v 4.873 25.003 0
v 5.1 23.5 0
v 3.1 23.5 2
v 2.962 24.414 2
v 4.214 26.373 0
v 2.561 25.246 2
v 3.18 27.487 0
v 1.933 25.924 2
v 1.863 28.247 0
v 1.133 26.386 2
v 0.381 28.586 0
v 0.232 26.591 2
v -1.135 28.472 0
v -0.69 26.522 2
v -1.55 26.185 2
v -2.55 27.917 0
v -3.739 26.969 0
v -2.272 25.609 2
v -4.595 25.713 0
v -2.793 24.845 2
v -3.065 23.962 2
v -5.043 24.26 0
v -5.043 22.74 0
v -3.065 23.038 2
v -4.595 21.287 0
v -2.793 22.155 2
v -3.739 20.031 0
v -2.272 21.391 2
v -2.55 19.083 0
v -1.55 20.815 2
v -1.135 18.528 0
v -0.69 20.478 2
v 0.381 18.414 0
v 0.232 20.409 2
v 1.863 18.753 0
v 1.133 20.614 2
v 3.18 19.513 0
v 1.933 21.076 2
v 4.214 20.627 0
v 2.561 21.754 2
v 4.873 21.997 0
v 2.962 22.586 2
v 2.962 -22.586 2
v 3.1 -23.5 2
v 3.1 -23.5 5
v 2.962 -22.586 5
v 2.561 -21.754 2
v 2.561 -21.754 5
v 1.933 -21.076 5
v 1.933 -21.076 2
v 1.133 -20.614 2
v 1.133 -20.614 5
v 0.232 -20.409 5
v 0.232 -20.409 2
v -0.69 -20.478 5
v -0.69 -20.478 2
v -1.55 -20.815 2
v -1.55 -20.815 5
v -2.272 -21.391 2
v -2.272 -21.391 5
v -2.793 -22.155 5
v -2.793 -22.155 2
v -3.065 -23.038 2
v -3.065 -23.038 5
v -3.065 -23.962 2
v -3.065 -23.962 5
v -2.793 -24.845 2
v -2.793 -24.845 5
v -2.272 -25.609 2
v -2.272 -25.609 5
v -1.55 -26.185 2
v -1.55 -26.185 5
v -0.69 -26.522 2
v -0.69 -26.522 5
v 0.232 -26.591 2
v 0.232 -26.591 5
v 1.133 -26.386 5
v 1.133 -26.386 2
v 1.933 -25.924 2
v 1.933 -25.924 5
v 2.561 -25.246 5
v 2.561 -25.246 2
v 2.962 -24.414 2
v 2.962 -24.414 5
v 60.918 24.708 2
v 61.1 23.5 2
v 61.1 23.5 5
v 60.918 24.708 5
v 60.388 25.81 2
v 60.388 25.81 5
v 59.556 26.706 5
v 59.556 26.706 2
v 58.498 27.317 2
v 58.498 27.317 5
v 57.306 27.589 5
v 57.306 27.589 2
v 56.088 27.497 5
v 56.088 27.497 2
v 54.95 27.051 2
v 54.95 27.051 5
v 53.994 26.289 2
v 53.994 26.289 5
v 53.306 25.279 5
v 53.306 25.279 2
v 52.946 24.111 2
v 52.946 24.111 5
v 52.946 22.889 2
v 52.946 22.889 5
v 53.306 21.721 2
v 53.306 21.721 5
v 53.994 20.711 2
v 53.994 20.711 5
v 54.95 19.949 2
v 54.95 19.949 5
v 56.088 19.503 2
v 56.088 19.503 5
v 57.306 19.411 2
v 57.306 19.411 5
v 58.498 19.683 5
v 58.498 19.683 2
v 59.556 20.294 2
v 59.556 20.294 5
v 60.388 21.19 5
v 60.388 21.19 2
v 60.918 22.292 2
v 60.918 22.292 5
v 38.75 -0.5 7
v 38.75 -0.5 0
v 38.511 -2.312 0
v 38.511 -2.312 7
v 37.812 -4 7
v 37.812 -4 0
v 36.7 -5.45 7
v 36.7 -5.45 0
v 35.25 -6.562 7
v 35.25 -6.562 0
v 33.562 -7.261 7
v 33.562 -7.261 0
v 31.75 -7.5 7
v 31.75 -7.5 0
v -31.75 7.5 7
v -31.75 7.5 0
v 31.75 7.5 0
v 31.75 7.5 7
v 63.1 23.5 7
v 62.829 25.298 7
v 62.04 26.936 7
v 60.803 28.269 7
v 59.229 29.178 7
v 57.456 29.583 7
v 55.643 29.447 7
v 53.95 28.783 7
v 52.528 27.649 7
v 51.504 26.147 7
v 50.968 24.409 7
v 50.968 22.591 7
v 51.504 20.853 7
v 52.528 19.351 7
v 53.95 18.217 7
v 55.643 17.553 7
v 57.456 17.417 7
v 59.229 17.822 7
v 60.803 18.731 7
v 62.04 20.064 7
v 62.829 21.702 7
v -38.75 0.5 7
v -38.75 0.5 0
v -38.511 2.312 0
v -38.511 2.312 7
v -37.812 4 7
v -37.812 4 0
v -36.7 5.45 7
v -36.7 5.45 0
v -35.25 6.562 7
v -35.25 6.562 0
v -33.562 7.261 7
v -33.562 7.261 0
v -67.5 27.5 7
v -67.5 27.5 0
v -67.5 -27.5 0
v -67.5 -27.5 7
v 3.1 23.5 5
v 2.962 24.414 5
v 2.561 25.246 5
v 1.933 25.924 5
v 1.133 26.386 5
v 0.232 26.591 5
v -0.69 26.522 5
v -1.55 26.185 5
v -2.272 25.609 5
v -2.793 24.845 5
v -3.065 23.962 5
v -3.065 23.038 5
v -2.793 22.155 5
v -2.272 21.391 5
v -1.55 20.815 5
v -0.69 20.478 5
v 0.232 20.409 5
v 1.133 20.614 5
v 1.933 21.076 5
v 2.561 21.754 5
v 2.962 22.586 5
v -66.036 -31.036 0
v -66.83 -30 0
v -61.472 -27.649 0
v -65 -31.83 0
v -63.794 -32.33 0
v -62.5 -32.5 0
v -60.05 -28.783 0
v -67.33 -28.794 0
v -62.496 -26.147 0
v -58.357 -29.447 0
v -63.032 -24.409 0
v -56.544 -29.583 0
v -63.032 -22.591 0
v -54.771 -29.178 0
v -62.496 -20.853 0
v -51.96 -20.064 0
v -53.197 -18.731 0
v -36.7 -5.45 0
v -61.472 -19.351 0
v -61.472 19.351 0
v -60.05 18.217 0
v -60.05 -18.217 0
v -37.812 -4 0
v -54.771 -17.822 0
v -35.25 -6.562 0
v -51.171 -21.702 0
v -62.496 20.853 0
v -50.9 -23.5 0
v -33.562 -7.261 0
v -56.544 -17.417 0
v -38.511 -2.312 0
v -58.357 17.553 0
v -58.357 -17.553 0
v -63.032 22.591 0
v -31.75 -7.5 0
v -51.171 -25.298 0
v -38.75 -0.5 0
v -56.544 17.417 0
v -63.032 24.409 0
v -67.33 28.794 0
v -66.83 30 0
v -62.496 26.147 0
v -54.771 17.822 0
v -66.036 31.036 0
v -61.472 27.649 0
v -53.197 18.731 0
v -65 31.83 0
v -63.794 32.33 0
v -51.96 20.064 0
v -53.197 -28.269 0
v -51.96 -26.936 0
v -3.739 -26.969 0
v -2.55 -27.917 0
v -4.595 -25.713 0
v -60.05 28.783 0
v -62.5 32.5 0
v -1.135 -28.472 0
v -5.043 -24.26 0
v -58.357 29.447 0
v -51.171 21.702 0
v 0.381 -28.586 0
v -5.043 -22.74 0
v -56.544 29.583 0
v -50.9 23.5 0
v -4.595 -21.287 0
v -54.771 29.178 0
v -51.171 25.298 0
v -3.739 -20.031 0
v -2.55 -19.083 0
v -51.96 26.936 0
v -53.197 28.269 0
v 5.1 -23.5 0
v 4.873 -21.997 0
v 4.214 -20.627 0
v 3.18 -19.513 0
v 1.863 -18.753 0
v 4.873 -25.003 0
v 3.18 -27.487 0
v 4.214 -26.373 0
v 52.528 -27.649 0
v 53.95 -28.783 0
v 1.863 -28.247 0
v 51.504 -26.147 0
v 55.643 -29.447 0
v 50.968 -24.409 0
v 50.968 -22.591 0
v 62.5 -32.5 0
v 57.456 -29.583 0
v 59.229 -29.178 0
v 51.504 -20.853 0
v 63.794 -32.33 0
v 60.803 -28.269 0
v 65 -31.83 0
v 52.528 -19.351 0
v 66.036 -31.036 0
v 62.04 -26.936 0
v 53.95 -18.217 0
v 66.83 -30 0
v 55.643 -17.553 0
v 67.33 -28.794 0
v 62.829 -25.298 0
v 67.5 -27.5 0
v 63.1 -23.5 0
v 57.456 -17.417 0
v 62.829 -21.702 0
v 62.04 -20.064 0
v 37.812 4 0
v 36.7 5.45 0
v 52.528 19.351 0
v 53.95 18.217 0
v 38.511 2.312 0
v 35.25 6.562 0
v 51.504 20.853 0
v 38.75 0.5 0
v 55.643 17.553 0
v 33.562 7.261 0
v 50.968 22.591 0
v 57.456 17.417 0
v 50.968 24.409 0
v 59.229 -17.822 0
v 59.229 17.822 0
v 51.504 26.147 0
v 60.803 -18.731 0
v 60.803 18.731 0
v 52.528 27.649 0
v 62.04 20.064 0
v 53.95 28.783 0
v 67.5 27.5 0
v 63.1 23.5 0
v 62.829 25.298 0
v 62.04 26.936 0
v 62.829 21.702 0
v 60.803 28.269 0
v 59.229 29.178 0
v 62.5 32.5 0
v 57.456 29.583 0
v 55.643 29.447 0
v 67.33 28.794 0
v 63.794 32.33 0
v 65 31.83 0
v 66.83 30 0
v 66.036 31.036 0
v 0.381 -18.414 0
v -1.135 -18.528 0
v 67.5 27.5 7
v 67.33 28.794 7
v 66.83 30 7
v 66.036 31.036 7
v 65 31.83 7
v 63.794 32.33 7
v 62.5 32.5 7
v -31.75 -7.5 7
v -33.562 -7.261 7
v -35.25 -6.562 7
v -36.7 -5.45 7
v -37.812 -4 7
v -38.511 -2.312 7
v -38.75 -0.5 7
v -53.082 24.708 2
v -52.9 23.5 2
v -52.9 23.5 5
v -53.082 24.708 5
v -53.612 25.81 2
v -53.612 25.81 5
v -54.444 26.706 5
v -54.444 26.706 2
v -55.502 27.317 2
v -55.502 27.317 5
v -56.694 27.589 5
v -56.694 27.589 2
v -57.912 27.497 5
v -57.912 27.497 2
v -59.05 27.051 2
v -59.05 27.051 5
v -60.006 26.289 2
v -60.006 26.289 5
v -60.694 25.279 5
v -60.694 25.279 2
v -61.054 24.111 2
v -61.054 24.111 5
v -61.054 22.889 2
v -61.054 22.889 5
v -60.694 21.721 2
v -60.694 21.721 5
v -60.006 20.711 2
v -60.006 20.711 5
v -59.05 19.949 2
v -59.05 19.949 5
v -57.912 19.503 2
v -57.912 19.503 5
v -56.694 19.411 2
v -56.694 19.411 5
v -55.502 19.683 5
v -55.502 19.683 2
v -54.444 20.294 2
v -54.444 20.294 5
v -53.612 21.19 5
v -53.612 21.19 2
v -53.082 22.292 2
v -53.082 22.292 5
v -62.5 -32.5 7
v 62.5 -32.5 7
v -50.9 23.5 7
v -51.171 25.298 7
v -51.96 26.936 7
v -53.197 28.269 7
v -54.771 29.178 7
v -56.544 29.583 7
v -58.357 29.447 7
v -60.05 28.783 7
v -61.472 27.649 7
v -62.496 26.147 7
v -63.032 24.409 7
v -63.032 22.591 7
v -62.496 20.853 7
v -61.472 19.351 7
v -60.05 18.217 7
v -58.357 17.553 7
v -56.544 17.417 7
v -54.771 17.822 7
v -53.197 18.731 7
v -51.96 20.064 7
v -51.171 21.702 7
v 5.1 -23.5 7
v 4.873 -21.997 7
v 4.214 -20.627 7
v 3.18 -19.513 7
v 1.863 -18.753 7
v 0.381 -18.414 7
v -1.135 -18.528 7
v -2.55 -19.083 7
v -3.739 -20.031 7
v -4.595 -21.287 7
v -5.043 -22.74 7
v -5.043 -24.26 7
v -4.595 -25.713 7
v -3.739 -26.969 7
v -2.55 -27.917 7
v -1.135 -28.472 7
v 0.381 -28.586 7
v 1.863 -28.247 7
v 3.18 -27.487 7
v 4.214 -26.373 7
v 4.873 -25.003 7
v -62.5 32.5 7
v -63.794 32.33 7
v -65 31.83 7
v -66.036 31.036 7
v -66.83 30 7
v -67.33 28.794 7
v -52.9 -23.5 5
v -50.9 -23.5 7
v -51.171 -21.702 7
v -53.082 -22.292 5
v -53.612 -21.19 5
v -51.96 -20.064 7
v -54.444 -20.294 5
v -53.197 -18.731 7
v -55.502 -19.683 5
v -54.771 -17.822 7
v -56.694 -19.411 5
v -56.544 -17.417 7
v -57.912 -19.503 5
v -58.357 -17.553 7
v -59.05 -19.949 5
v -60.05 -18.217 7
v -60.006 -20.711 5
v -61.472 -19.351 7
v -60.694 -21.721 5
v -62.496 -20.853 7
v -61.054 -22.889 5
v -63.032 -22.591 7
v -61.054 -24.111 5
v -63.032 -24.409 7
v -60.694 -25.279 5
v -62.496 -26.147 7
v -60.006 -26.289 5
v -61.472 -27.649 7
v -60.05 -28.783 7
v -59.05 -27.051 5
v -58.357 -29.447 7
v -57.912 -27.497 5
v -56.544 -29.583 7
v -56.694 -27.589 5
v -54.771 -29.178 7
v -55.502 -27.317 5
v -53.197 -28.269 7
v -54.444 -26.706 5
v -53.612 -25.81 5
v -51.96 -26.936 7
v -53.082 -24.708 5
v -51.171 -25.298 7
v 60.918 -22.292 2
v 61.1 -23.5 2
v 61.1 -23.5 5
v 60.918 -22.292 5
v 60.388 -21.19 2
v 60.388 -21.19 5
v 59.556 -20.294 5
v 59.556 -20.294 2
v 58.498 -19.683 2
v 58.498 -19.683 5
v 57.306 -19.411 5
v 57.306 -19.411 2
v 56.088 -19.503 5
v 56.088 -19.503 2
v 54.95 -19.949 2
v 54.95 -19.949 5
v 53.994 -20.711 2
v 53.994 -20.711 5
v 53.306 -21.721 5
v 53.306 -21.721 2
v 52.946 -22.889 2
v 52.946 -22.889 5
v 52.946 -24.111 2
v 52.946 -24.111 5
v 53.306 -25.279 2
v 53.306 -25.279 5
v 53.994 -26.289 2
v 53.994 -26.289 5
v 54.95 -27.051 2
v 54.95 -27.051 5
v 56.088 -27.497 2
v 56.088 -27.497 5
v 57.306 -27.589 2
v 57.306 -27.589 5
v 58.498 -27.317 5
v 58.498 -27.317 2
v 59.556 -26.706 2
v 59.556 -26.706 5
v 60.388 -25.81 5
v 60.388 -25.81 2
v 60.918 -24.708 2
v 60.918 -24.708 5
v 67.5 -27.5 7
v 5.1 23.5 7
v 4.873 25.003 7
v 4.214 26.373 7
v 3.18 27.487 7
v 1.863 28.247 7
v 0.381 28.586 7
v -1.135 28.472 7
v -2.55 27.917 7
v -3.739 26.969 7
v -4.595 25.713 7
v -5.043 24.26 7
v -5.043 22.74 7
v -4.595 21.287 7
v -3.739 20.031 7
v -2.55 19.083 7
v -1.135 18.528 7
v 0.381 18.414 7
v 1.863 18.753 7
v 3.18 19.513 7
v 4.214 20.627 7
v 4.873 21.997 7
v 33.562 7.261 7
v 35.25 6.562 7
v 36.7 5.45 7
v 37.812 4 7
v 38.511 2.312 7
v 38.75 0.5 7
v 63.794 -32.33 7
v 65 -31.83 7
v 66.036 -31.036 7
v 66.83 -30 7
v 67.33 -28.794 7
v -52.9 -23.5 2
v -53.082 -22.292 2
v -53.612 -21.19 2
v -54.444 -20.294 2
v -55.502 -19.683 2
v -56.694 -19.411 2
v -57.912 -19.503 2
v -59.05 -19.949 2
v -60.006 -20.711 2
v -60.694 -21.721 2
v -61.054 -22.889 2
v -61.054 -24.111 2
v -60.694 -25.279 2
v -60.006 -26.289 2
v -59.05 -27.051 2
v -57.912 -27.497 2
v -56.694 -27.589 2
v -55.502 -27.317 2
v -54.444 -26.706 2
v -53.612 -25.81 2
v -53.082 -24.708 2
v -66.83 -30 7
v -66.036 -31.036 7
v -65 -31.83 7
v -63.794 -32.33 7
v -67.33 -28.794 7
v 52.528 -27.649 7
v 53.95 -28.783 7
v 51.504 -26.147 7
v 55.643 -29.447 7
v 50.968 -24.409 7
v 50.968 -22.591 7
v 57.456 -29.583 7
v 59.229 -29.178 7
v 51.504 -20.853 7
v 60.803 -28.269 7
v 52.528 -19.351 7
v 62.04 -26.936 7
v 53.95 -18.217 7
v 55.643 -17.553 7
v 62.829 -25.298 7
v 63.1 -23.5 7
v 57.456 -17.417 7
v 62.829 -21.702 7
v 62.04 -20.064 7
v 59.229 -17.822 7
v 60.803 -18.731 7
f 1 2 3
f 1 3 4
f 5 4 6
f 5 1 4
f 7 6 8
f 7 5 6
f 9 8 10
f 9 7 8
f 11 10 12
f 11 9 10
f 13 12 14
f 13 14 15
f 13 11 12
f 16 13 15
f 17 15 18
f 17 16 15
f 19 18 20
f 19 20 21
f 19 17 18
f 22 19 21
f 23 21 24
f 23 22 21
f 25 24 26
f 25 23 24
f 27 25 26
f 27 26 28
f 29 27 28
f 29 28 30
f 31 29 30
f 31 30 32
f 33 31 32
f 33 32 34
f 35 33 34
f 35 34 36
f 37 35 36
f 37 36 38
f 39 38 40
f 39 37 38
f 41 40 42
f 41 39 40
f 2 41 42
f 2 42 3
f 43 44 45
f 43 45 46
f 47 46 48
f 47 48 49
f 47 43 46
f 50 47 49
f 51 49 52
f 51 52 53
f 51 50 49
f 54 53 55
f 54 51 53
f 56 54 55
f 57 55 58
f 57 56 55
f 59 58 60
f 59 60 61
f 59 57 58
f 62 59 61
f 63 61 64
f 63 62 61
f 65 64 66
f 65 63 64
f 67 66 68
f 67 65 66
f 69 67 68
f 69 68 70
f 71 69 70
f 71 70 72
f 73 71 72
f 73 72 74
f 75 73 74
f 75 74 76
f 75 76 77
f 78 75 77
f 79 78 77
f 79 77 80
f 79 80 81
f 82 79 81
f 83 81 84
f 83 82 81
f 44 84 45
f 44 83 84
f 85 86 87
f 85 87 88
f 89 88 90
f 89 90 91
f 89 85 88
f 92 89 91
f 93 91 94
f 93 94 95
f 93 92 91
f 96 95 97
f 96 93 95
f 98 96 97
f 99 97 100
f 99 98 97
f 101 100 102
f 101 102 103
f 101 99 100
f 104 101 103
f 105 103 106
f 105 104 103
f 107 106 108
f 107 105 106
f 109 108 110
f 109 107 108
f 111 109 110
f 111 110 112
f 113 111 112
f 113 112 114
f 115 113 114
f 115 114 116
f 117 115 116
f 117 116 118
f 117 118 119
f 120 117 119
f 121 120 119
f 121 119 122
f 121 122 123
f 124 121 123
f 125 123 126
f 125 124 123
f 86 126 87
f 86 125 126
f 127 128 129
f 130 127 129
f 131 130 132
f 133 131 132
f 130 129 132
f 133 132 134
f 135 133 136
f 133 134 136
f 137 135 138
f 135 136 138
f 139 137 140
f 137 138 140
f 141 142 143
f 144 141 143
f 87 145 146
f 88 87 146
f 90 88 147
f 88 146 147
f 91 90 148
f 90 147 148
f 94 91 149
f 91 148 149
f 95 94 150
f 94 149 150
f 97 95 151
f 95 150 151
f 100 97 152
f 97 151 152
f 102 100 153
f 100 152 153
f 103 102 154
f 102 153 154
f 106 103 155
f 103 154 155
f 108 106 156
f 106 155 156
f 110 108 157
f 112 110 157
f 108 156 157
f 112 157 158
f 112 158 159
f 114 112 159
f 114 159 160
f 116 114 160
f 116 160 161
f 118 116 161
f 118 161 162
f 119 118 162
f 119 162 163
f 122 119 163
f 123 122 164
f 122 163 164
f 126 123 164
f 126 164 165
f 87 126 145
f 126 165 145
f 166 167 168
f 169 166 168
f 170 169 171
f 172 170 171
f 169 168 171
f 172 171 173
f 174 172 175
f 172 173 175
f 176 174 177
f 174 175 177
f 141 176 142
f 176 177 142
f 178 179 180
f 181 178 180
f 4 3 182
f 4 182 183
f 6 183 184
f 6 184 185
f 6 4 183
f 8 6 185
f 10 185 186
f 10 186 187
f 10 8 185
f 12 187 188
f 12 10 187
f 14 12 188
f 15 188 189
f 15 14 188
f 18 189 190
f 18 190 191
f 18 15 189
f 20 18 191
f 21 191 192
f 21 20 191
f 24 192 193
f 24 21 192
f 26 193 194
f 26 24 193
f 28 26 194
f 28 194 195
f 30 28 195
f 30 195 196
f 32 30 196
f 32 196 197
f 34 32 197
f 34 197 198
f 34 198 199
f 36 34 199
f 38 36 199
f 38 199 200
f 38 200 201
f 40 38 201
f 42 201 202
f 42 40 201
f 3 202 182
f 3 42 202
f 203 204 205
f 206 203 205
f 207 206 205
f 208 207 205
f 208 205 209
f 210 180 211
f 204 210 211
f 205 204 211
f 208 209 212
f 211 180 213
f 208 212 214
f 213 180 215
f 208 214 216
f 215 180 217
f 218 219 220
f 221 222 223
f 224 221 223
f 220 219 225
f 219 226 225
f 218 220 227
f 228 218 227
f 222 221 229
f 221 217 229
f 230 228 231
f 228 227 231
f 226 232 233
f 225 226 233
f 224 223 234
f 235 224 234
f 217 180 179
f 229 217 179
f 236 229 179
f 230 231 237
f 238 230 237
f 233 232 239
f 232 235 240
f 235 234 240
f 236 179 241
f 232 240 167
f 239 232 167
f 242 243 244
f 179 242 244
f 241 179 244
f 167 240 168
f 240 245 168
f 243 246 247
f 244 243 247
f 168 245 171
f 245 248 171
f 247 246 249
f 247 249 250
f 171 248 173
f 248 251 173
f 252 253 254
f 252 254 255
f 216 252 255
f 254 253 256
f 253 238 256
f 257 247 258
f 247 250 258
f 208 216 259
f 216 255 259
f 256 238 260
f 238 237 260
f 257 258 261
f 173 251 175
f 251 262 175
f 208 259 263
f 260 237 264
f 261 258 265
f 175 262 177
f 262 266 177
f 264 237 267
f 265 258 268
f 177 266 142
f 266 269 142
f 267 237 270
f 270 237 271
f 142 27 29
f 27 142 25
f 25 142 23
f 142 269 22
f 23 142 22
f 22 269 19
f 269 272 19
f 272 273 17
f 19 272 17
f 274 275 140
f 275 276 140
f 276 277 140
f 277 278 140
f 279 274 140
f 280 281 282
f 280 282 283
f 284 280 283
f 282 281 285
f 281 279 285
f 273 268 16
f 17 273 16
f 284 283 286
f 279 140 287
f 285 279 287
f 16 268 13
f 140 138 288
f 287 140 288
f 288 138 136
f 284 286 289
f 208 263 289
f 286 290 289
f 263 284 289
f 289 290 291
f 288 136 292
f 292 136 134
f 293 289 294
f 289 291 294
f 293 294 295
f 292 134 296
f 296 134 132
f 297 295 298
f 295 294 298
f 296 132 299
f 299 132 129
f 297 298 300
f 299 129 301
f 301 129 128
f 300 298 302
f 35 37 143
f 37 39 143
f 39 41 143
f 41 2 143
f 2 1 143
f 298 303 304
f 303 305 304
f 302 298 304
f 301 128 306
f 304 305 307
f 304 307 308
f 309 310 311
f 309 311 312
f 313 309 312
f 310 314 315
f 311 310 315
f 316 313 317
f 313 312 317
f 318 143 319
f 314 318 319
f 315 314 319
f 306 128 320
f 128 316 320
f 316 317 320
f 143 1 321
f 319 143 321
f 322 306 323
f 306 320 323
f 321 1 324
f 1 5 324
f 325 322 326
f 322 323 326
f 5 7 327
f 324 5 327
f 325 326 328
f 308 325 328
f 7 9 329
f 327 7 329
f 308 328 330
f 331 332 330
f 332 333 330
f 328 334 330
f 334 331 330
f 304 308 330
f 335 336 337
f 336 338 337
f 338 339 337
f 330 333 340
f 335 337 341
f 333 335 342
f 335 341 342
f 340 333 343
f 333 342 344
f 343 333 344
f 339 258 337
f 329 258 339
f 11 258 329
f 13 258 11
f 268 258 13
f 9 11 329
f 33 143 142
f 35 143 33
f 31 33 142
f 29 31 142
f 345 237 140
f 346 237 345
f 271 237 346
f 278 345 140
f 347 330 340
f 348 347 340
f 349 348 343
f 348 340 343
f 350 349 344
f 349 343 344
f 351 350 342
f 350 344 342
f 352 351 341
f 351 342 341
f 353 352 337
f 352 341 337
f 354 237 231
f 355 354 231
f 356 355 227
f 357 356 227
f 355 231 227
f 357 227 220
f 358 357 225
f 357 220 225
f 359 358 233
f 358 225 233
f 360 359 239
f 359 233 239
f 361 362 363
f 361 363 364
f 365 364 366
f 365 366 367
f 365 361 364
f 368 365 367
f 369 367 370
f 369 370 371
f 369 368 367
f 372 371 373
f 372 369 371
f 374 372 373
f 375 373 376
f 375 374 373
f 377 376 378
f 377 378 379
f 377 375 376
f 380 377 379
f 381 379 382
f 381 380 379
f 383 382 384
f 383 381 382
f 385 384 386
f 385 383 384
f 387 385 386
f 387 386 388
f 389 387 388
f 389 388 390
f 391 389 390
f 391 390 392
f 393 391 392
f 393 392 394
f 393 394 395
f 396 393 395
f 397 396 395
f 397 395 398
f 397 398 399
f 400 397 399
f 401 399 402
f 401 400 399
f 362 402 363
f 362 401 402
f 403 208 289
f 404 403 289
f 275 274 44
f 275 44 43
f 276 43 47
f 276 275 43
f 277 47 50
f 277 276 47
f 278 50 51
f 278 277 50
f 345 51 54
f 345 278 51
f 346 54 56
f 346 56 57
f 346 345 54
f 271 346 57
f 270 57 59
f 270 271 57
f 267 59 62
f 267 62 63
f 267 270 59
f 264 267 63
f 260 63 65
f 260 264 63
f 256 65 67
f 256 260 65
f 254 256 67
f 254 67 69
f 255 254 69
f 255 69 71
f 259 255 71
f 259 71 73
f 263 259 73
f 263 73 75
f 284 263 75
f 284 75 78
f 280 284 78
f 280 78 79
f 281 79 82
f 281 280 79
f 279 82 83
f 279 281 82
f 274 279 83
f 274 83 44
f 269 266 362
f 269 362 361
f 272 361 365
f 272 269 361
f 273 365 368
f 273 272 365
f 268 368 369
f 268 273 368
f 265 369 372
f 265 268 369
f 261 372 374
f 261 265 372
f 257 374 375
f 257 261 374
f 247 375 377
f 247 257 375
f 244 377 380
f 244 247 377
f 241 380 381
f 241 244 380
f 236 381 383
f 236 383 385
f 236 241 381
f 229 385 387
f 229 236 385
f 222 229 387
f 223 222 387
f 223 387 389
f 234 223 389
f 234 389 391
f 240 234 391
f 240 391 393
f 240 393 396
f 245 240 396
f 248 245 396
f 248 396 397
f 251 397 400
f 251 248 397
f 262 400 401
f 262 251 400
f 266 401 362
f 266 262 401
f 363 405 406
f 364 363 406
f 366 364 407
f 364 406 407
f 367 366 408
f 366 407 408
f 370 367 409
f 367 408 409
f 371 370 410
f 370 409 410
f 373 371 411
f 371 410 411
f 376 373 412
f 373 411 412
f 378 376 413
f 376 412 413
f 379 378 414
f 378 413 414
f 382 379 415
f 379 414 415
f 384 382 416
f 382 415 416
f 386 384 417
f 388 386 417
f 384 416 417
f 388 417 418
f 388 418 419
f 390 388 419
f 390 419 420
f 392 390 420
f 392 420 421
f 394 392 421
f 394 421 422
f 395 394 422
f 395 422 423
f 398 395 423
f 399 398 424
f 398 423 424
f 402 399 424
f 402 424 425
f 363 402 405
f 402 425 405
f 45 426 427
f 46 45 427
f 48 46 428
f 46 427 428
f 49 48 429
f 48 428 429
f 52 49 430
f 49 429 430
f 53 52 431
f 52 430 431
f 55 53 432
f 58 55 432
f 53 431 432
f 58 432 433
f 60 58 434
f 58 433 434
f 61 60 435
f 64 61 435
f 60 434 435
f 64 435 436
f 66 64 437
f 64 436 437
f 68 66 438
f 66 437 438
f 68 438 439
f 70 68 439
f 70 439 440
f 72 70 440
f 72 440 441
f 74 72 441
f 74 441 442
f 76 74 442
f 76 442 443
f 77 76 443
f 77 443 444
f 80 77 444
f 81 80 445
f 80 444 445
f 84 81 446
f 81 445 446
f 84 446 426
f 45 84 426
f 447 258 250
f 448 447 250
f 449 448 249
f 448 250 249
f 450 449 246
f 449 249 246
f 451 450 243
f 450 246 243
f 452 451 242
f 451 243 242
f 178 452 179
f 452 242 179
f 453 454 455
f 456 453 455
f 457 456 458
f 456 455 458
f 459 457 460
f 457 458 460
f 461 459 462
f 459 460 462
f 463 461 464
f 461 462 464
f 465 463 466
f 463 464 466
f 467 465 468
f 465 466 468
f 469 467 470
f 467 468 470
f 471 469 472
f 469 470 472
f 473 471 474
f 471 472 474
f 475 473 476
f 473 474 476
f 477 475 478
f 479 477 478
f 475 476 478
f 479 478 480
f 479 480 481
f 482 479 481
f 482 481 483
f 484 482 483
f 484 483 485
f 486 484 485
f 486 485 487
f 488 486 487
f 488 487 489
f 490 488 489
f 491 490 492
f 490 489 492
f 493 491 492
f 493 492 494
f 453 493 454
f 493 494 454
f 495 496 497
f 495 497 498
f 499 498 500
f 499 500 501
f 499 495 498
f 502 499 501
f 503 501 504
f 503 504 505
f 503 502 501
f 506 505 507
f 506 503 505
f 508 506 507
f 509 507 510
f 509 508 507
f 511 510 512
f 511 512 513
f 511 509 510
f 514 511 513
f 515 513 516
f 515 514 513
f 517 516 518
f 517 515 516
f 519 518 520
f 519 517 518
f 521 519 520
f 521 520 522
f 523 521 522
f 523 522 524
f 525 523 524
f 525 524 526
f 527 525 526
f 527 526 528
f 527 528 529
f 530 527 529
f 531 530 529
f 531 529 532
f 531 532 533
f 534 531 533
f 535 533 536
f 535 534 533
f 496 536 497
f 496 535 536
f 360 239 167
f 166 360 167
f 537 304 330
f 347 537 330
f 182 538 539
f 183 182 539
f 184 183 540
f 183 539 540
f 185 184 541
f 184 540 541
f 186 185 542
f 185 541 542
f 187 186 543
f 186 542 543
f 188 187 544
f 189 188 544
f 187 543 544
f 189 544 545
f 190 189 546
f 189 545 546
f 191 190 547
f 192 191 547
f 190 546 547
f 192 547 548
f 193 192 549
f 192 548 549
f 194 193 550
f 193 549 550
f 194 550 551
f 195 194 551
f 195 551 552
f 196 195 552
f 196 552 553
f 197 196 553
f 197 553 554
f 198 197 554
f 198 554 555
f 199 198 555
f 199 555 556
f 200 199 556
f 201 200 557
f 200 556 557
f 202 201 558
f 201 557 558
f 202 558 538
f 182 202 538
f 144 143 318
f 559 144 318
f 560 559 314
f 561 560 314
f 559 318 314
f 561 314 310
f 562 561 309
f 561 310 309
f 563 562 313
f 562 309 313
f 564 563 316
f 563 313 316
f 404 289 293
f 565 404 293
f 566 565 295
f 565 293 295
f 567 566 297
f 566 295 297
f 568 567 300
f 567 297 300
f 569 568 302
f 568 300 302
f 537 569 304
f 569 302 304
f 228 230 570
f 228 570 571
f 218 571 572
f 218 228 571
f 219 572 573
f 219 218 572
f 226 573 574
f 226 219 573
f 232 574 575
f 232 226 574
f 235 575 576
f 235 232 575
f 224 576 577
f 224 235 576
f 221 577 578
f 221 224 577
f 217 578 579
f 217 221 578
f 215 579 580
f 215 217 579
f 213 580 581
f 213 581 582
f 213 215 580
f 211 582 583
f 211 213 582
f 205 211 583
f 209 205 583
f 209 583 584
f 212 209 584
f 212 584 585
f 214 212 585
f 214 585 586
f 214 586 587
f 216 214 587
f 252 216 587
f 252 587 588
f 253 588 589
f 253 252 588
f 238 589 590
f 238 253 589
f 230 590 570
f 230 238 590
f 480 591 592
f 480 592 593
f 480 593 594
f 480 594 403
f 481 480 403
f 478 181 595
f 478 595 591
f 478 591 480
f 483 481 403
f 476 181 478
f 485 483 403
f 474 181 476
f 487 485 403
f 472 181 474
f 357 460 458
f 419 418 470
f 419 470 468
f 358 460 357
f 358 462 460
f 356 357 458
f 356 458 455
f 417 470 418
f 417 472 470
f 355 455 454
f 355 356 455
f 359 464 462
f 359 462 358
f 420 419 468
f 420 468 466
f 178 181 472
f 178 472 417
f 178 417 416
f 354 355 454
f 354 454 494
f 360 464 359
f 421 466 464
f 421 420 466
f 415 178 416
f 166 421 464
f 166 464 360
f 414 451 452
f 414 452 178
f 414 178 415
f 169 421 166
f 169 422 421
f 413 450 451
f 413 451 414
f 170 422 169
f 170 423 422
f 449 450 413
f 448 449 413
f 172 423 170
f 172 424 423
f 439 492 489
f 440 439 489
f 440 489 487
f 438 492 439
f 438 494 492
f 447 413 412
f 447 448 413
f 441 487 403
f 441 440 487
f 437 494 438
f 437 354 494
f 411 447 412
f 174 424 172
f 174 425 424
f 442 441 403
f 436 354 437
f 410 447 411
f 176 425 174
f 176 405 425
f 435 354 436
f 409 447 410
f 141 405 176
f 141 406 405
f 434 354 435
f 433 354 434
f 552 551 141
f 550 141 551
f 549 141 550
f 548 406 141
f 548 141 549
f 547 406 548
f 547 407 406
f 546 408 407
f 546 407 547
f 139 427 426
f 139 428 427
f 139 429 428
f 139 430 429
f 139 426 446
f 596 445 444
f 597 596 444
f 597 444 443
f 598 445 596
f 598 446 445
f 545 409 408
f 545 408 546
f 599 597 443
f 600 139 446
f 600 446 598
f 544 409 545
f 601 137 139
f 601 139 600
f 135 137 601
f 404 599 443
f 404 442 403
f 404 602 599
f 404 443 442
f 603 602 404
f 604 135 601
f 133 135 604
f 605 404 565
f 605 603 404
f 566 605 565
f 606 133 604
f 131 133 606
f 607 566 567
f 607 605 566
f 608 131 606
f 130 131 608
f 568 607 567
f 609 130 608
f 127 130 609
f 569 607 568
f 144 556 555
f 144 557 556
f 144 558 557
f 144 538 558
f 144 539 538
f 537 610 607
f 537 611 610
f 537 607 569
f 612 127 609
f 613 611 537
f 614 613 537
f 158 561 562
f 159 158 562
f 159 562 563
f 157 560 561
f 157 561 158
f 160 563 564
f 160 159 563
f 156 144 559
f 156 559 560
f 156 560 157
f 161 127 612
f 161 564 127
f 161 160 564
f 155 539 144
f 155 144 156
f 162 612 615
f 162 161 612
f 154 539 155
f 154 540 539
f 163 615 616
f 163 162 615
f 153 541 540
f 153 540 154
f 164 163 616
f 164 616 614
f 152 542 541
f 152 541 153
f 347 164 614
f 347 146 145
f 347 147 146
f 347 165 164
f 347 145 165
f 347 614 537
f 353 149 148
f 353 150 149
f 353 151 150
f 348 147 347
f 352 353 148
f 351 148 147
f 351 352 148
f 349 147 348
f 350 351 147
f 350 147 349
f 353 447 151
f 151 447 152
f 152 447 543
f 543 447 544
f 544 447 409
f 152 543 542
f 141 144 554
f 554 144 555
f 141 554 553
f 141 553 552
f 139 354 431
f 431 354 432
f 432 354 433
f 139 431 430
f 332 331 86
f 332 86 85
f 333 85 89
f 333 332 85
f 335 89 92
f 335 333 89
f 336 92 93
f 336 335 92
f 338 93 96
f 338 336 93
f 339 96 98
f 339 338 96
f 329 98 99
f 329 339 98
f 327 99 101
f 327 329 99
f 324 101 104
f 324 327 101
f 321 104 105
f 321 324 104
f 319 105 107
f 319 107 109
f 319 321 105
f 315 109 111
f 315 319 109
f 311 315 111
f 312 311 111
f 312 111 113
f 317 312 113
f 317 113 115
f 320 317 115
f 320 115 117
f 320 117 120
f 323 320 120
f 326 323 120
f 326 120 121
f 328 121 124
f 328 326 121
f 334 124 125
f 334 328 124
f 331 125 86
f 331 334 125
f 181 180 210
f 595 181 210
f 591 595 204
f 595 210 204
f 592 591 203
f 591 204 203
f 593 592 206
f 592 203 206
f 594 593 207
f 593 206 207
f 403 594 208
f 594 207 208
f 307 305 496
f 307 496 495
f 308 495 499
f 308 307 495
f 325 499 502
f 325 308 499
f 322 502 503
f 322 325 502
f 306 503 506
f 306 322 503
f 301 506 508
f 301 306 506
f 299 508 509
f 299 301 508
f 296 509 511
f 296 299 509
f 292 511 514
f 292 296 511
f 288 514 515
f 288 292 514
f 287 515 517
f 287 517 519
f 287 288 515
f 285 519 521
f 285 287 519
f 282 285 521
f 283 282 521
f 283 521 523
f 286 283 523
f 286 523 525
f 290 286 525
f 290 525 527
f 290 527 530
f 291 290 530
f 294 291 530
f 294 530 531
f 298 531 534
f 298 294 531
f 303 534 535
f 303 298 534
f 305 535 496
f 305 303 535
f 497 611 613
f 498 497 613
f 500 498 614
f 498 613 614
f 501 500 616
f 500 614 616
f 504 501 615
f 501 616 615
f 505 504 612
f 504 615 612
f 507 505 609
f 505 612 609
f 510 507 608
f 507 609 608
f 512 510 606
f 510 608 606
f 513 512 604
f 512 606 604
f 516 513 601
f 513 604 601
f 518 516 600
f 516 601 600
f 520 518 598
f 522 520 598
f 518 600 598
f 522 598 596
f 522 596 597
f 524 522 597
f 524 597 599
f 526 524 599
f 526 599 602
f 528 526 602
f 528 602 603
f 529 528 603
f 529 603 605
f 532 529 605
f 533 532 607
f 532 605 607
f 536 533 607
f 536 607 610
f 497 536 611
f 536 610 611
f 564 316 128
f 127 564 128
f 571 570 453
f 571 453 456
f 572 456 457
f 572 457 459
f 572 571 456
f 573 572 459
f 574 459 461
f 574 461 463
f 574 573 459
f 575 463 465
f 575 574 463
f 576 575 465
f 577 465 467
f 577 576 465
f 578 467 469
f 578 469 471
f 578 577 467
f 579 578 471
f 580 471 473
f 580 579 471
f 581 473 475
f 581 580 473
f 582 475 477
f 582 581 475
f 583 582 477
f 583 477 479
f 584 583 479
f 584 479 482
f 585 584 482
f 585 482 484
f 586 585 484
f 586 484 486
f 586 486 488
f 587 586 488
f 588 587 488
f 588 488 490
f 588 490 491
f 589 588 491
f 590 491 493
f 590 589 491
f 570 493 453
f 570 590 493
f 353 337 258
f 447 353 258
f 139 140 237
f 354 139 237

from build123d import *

# Parameters (mm, degrees)
F0_R     = 4.1
F0_R_2   = 3.1
F1_DEPTH = 7
F2_SIZE  = 2


with BuildPart() as f1:
    # F0 (on Top) → F1 (new body)
    with BuildSketch(Plane.XY):
        with BuildLine():
            ThreePointArc((67.5, 27.5), (66.035534, 31.035534), (62.5, 32.5))
            Line((62.5, 32.5), (-62.5, 32.5))
            ThreePointArc((-62.5, 32.5), (-66.035534, 31.035534), (-67.5, 27.5))
            Line((-67.5, 27.5), (-67.5, -27.5))
            ThreePointArc((-67.5, -27.5), (-66.035534, -31.035534), (-62.5, -32.5))
            Line((-62.5, -32.5), (62.5, -32.5))
            ThreePointArc((62.5, -32.5), (66.035534, -31.035534), (67.5, -27.5))
            Line((67.5, -27.5), (67.5, 27.5))
        make_face()
        with Locations((-57, -23.5)):
            Circle(F0_R, mode=Mode.SUBTRACT)
        with Locations((0, -23.5)):
            Circle(F0_R_2, mode=Mode.SUBTRACT)
        with Locations((57, -23.5)):
            Circle(F0_R, mode=Mode.SUBTRACT)
        with Locations((-57, 23.5)):
            Circle(F0_R, mode=Mode.SUBTRACT)
        with BuildLine():
            Line((-31.75, 7.5), (31.75, 7.5))
            ThreePointArc((31.75, 7.5), (36.699747, 5.449747), (38.75, 0.5))
            Line((38.75, 0.5), (38.75, -0.5))
            ThreePointArc((38.75, -0.5), (36.699747, -5.449747), (31.75, -7.5))
            Line((31.75, -7.5), (-31.75, -7.5))
            ThreePointArc((-31.75, -7.5), (-36.699747, -5.449747), (-38.75, -0.5))
            Line((-38.75, -0.5), (-38.75, 0.5))
            ThreePointArc((-38.75, 0.5), (-36.699747, 5.449747), (-31.75, 7.5))
        make_face(mode=Mode.SUBTRACT)
        with Locations((0, 23.5)):
            Circle(F0_R_2, mode=Mode.SUBTRACT)
        with Locations((57, 23.5)):
            Circle(F0_R, mode=Mode.SUBTRACT)
    extrude(amount=F1_DEPTH)

    # F2
    f2_edges = [f1.edges().sort_by_distance(p)[0] for p in [
        (-52.9, -23.5, 3.5),
        (-61.1, -23.5, 0),
        (-61.1, -23.5, 7),
        (-52.9, 23.5, 3.5),
        (-61.1, 23.5, 0),
        (-61.1, 23.5, 7),
        (3.1, 23.5, 3.5),
        (-3.1, 23.5, 0),
        (-3.1, 23.5, 7),
        (61.1, 23.5, 3.5),
        (52.9, 23.5, 0),
        (52.9, 23.5, 7),
        (61.1, -23.5, 3.5),
        (52.9, -23.5, 0),
        (52.9, -23.5, 7),
        (3.1, -23.5, 3.5),
        (-3.1, -23.5, 0),
        (-3.1, -23.5, 7),
    ]]
    chamfer(f2_edges, length=F2_SIZE)


solid = f1.part
